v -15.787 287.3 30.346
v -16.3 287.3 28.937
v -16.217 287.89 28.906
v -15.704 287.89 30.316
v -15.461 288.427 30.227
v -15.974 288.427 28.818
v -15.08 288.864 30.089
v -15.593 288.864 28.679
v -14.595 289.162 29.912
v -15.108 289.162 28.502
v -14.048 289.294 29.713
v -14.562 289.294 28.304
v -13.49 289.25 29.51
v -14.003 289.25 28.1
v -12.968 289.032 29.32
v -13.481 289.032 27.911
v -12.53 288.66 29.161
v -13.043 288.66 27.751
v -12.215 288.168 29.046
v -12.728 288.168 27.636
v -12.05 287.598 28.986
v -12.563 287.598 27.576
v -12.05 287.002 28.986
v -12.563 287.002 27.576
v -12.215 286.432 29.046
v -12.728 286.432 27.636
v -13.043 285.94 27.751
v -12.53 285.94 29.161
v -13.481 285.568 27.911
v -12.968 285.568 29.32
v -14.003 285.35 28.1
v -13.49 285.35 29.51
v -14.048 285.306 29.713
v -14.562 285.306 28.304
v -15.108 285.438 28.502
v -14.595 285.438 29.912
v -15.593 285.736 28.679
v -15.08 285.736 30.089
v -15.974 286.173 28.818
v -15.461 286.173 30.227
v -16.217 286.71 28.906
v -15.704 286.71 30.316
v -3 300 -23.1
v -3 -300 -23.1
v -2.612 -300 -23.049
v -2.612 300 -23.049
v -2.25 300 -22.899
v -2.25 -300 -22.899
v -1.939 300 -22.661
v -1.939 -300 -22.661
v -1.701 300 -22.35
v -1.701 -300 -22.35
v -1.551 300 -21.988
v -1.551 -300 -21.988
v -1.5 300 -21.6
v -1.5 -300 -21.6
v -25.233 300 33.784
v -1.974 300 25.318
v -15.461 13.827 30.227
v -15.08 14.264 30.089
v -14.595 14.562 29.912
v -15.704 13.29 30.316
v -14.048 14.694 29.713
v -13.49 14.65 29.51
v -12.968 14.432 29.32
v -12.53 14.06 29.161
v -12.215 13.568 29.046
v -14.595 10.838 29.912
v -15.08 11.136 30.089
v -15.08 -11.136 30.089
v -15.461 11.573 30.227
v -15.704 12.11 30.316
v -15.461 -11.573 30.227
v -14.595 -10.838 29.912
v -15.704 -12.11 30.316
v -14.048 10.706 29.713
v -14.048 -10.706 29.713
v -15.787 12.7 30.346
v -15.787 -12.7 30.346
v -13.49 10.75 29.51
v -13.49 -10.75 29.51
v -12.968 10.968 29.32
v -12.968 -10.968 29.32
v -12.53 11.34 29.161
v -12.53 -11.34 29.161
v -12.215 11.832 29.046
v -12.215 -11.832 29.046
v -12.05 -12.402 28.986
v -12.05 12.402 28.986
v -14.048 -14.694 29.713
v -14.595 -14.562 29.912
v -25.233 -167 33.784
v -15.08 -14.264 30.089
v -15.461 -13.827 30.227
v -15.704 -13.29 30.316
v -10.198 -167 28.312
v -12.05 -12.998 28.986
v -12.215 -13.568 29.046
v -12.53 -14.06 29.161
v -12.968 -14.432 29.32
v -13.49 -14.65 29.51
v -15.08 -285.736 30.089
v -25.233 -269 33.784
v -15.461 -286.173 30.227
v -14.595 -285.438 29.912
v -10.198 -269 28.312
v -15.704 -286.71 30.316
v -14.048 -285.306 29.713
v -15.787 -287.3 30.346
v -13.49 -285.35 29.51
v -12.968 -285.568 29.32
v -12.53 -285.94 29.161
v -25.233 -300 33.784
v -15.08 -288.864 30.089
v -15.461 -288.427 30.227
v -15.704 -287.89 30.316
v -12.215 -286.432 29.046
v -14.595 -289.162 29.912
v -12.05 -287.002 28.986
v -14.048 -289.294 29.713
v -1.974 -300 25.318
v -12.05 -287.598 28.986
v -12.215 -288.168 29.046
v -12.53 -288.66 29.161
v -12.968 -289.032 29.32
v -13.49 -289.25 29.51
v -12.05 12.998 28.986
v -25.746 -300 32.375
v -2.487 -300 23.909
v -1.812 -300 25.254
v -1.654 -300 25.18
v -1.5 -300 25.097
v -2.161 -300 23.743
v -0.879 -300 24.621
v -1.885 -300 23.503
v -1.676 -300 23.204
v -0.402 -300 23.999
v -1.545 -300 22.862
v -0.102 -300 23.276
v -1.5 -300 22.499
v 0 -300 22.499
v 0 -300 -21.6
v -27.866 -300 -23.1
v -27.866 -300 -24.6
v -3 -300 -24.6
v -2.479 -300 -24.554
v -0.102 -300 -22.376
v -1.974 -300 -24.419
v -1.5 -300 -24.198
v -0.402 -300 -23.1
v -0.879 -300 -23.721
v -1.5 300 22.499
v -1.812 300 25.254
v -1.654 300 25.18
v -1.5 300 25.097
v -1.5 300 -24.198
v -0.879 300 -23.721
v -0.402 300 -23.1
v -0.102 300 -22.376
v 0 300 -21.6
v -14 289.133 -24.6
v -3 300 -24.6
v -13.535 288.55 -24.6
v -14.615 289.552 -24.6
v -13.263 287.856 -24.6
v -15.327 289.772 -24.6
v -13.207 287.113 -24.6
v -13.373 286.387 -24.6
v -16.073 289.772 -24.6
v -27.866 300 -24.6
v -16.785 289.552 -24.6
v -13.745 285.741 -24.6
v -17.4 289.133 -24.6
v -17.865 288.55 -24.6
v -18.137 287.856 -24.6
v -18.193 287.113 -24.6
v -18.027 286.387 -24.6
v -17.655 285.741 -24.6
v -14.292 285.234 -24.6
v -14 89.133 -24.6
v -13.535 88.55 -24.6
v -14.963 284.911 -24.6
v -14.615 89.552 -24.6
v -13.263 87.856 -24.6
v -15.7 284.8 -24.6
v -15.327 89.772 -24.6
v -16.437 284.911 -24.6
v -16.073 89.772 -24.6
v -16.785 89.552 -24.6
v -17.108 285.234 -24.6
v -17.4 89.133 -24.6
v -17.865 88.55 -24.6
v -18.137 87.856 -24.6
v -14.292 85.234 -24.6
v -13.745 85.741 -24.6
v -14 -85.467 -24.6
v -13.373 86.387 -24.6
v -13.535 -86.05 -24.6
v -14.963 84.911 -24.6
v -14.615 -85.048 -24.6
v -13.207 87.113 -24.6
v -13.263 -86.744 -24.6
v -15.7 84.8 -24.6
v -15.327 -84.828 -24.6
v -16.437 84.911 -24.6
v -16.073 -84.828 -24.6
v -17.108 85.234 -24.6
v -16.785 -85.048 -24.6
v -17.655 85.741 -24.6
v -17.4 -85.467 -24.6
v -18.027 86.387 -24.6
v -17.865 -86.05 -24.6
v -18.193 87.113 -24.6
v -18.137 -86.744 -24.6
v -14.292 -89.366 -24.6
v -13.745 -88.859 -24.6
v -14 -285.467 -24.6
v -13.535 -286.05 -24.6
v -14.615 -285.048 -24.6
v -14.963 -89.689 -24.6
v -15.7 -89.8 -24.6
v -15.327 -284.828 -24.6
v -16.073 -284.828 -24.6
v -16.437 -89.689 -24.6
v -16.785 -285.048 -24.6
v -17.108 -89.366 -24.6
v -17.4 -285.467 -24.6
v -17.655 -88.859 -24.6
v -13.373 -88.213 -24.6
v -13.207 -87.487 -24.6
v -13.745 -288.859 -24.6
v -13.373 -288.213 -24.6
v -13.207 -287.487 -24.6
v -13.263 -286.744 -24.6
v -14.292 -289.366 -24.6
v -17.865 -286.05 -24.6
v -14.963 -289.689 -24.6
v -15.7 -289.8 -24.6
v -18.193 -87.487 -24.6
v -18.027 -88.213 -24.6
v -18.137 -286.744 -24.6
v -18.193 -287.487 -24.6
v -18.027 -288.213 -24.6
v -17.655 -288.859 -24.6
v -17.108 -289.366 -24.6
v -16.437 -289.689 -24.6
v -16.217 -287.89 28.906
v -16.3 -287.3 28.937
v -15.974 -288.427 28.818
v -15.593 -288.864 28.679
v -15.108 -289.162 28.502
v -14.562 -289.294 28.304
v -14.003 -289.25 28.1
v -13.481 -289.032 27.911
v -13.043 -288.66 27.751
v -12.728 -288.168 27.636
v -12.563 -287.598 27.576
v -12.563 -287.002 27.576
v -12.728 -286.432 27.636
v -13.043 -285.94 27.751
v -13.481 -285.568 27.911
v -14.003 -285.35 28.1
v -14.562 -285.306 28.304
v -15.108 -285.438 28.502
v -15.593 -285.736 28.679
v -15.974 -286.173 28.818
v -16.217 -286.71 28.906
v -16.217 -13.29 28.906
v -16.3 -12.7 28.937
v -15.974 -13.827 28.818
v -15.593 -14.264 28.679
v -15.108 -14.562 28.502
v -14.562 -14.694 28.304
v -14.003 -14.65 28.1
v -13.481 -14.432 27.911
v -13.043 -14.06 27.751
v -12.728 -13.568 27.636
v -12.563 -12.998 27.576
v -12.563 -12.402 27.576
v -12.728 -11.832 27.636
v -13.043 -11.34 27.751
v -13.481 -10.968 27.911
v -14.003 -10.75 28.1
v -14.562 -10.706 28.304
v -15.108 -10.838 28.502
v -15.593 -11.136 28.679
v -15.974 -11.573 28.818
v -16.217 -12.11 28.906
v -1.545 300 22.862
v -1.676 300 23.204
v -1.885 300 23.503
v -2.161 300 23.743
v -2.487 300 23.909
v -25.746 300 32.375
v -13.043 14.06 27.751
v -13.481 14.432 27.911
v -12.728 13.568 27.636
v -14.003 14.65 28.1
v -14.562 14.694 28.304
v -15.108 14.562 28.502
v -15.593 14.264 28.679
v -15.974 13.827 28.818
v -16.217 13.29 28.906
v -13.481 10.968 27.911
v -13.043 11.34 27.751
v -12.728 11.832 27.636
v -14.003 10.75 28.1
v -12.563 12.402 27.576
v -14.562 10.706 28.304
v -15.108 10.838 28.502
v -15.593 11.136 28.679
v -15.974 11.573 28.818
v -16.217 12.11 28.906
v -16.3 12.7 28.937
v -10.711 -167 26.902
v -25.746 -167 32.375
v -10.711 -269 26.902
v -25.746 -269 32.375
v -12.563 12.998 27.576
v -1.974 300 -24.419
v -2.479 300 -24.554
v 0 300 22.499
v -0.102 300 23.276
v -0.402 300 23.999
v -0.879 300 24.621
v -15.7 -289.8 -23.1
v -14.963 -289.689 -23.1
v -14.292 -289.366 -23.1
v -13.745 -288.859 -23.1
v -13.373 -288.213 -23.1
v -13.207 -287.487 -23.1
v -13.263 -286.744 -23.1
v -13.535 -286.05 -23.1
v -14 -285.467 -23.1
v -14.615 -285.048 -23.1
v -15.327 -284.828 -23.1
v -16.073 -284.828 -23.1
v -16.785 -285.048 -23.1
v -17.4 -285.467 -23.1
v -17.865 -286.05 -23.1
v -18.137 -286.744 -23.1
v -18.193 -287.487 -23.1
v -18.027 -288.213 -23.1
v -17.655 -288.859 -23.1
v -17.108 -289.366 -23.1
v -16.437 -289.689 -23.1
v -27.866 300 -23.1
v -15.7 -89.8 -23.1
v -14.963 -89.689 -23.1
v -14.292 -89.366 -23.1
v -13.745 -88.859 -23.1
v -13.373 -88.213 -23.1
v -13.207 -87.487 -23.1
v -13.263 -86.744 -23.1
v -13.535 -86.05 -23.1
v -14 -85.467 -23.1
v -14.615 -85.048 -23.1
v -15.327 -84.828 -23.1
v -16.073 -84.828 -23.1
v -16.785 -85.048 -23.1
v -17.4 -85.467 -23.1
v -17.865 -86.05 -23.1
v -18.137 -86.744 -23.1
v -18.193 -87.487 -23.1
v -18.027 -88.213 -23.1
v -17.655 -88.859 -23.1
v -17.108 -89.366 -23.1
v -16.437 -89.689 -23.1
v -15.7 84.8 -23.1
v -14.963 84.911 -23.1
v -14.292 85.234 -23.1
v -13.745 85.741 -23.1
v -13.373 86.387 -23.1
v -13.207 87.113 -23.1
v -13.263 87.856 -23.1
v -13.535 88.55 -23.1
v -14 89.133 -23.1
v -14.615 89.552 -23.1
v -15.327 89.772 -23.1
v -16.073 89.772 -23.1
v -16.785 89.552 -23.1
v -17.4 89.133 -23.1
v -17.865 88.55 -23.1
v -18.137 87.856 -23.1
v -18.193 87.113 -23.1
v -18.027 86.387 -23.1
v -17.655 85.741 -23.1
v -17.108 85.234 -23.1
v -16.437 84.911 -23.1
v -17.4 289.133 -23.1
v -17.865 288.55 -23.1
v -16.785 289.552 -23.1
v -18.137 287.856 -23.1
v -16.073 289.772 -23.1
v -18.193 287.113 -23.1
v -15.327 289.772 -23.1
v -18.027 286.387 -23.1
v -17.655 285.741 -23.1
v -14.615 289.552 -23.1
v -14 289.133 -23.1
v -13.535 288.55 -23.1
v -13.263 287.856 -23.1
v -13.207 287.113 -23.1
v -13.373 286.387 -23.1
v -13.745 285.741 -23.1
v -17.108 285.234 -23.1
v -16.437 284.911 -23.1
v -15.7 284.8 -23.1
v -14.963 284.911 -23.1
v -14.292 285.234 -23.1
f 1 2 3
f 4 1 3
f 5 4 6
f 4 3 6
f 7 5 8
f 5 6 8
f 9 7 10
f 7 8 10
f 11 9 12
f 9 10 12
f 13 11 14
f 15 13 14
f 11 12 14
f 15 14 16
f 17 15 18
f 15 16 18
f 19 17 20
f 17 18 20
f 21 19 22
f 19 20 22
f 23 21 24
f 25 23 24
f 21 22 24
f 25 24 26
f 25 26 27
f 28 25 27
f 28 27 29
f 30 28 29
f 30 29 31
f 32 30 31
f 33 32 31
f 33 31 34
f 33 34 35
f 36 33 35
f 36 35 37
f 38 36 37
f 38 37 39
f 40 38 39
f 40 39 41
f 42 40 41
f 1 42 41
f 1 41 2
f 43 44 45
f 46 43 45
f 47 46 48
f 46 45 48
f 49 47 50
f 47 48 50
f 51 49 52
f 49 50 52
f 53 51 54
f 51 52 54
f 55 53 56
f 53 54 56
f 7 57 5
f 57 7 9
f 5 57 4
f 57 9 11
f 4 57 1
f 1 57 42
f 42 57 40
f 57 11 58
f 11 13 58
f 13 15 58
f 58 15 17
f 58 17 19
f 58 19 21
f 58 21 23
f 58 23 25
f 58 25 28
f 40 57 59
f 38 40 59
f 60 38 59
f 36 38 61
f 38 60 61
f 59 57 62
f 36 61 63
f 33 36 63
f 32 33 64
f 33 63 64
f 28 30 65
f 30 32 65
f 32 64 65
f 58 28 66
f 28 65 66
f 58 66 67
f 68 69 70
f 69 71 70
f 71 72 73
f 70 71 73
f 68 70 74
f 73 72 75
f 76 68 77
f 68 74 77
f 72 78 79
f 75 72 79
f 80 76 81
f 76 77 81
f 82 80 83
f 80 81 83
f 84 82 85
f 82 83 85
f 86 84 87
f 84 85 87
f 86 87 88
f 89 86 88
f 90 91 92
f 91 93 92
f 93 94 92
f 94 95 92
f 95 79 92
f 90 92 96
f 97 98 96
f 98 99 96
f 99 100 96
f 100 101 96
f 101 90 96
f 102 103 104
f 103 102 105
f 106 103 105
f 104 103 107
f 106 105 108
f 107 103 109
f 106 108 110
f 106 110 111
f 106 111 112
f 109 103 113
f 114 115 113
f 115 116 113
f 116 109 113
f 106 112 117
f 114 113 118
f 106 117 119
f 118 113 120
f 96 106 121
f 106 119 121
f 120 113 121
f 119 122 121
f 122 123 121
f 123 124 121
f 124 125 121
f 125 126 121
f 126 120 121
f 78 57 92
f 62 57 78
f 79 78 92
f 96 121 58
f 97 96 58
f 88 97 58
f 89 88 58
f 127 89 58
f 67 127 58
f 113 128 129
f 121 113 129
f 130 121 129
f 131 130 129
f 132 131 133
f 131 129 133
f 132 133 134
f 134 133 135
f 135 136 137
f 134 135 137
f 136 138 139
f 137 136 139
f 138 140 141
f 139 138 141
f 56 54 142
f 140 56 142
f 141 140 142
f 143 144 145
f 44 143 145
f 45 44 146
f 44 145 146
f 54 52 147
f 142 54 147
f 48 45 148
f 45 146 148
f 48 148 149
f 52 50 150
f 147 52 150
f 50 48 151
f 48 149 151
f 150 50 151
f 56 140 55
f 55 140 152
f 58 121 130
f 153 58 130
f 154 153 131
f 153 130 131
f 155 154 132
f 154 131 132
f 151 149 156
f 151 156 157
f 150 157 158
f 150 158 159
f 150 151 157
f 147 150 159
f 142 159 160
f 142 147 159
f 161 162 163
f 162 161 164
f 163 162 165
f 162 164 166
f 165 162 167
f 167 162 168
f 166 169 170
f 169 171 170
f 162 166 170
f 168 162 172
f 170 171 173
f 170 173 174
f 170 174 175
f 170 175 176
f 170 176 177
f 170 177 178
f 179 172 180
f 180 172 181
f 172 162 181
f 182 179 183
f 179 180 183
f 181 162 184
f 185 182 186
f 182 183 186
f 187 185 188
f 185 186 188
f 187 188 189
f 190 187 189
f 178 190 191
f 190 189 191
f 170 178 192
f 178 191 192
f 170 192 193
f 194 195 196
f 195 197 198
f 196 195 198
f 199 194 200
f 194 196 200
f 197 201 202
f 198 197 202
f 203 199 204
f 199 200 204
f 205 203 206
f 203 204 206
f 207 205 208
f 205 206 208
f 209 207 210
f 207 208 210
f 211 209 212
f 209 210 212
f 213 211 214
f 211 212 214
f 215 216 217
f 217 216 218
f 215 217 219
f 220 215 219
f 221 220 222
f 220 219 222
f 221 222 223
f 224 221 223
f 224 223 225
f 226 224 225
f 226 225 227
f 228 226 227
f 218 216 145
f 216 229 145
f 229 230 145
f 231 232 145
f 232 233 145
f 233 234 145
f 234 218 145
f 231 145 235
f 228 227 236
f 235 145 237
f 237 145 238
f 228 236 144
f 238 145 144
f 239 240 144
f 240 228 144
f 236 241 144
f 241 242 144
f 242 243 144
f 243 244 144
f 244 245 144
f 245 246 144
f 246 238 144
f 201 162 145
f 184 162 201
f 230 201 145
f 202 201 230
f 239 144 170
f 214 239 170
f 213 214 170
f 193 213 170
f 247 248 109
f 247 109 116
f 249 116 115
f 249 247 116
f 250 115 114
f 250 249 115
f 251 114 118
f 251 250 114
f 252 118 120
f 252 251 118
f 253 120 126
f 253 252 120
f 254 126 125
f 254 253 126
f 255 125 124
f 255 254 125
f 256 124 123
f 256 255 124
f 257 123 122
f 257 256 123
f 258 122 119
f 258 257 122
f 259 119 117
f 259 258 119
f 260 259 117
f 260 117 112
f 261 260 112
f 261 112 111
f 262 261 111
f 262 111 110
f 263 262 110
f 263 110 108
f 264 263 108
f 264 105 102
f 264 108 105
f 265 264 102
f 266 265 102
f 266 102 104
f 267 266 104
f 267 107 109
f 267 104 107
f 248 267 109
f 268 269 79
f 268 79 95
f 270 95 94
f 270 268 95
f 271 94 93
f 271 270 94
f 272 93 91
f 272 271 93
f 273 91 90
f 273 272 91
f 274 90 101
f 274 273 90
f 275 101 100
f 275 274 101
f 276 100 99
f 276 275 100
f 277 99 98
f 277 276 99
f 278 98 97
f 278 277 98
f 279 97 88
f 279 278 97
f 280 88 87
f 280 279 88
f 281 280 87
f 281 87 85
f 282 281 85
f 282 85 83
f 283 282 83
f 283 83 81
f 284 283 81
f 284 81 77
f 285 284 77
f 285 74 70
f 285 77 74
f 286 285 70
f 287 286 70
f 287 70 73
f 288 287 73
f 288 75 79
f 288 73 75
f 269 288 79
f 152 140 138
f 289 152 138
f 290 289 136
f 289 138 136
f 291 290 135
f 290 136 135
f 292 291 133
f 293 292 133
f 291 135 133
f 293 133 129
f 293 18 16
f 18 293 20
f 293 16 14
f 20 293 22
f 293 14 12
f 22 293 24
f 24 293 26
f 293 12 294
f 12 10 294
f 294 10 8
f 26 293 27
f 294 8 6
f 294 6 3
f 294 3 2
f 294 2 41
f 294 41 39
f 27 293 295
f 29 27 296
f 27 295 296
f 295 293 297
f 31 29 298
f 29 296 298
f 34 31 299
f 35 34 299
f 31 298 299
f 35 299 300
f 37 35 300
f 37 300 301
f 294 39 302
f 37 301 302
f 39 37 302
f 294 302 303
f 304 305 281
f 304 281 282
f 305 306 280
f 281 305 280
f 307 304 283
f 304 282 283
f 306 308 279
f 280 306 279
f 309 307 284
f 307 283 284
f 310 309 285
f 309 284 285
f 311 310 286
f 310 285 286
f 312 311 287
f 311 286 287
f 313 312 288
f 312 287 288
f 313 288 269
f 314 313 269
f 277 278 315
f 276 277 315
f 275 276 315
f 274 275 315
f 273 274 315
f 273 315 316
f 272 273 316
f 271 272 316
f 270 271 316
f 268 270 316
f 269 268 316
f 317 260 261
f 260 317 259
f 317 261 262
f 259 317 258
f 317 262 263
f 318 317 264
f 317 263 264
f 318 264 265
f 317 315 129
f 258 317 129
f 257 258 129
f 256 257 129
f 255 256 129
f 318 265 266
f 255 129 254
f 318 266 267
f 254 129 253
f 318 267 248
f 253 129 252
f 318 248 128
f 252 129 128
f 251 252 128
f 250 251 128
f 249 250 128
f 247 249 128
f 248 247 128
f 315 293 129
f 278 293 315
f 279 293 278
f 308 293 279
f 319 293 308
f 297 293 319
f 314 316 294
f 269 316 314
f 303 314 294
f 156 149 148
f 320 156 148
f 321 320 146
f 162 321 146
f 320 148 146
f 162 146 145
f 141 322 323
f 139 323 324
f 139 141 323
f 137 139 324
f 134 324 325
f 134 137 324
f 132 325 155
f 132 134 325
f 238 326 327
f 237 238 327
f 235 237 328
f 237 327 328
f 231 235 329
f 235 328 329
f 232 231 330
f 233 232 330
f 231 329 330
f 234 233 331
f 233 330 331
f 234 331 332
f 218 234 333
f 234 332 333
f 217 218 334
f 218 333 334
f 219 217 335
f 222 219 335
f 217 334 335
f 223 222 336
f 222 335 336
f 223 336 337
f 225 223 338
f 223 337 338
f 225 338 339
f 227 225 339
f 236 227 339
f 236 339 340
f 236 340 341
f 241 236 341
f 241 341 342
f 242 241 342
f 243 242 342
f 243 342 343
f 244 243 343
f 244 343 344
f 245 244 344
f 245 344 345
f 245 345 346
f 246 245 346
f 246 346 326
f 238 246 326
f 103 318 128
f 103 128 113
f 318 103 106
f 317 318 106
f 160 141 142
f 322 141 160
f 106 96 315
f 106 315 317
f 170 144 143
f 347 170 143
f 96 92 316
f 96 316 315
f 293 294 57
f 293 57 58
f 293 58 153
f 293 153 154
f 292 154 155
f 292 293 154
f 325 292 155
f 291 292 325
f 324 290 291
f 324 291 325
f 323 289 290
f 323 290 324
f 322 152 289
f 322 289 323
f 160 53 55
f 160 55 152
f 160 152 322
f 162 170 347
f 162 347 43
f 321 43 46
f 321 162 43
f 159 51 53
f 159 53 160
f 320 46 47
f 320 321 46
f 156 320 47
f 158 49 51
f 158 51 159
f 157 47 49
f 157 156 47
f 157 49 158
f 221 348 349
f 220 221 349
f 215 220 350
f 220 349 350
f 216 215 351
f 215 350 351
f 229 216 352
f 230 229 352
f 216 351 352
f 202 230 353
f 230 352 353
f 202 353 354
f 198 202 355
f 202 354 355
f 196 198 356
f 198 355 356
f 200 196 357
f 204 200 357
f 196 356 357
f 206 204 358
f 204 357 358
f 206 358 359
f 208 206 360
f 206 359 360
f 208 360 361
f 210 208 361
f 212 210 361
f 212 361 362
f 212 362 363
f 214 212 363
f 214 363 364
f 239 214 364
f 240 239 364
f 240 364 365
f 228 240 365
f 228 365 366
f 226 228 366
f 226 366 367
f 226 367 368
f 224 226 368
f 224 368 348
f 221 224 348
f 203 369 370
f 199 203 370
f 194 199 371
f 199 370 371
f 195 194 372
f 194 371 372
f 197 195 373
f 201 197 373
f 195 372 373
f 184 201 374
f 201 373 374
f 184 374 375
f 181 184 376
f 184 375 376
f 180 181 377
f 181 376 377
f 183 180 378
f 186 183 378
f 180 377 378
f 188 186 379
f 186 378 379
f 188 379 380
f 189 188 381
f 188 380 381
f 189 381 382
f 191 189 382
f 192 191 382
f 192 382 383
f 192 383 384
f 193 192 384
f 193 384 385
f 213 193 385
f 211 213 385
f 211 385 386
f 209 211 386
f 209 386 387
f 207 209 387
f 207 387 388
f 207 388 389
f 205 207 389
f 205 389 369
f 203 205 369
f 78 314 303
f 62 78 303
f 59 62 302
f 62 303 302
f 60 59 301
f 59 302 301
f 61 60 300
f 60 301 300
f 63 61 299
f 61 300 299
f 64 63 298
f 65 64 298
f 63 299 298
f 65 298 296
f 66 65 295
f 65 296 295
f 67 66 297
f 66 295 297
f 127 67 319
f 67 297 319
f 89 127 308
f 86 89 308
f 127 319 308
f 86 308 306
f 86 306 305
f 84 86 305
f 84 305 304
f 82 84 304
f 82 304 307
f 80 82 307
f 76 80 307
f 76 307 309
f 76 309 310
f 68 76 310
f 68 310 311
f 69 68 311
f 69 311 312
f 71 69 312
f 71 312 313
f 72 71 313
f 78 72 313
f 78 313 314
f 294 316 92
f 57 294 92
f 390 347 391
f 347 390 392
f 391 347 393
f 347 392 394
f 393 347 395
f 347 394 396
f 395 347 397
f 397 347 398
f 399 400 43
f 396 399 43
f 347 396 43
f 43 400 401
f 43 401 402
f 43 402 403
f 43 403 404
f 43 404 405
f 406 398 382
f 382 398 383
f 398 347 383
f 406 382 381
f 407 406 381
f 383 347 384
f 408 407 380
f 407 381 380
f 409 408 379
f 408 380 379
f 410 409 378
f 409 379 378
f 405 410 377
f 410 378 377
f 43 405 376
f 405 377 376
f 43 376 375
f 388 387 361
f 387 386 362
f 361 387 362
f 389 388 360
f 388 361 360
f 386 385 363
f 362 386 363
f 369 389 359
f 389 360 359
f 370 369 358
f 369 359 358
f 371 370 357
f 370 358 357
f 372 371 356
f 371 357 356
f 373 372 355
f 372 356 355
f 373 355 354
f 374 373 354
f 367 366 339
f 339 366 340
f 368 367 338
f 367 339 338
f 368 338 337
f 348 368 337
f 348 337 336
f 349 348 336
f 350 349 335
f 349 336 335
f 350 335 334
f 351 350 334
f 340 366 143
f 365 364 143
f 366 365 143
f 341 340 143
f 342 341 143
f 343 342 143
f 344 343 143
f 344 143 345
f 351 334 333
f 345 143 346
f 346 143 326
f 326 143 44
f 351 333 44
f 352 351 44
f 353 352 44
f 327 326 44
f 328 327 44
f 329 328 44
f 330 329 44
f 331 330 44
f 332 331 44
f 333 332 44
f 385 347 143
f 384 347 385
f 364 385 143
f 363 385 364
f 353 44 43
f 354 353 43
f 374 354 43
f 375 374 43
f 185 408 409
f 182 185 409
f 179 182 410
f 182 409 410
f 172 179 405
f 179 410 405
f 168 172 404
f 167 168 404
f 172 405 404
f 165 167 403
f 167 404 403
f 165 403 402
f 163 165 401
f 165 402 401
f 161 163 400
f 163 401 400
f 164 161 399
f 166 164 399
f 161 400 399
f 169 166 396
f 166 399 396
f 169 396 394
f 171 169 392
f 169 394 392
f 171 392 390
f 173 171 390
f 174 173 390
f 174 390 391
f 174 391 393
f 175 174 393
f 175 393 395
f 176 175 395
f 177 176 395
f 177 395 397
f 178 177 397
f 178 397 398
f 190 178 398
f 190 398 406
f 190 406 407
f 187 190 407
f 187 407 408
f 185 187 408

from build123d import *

# Parameters (mm, degrees)
SKETCH1_W                    = 600
SKETCH1_H                    = 100
BASE_FLANGE1_DEPTH           = 1.5
SKETCHED_START               = -300
SKETCHED_BEND1_DEPTH         = 600
SKETCHED_BEND1_2_DEPTH       = 600
SKETCHED_BEND2_DEPTH         = 600
SKETCHED_BEND2_2_DEPTH       = 600
F_4_0_4_DIAMETER_HOLE1_D     = 4
F_5_0_5_DIAMETER_HOLE1_D     = 5
F_5_0_5_DIAMETER_HOLE1_DEPTH = 1.5
CUT_EXTRUDE1_REACH           = 307.656
SKETCH12_W                   = 102
SKETCH12_H                   = 16


# Read off the part's stored shape, not the designer's step: Sketched Bend1, Sketched Bend2
# Sheet-metal steps are written as plain solids
with BuildPart() as part:
    # Sketch1 → Base-Flange1 (new body)
    with BuildSketch(Plane.YZ):
        Rectangle(SKETCH1_W, SKETCH1_H)
    extrude(amount=-BASE_FLANGE1_DEPTH)

    # Sketched Bend1 outline → Sketched Bend1 (cut)
    with BuildSketch(Plane(origin=(0, 0, 0), x_dir=(1, 0, 0), z_dir=(0, 1, 0)).offset(SKETCHED_START)):
        with BuildLine():
            Line((-1.5, 50), (-1.5, 24.198076212))
            ThreePointArc((-1.5, 24.198076212), (-0.401923788, 23.1), (0, 21.6))
            Line((0, 21.6), (0, 50))
            Line((0, 50), (-1.5, 50))
        make_face()
    extrude(amount=SKETCHED_BEND1_DEPTH, mode=Mode.SUBTRACT)

    # Sketched Bend1 2 outline → Sketched Bend1 2 (add)
    with BuildSketch(Plane(origin=(0, 0, 0), x_dir=(1, 0, 0), z_dir=(0, 1, 0)).offset(SKETCHED_START)):
        with BuildLine():
            Line((-27.865708265, 24.6), (-27.865708265, 23.1))
            Line((-27.865708265, 23.1), (-3, 23.1))
            ThreePointArc((-3, 23.1), (-1.939339828, 22.660660172), (-1.5, 21.6))
            Line((-1.5, 21.6), (-1.5, 24.198076212))
            ThreePointArc((-1.5, 24.198076212), (-2.223542865, 24.497777479), (-3, 24.6))
            Line((-3, 24.6), (-27.865708265, 24.6))
        make_face()
    extrude(amount=SKETCHED_BEND1_2_DEPTH)

    # Sketched Bend2 outline → Sketched Bend2 (cut)
    with BuildSketch(Plane(origin=(0, 0, 0), x_dir=(1, 0, 0), z_dir=(0, 1, 0)).offset(SKETCHED_START)):
        with BuildLine():
            ThreePointArc((0, -22.499377385), (-0.401923789, -23.999377385), (-1.5, -25.097453597))
            Line((-1.5, -25.097453597), (-1.5, -50))
            Line((-1.5, -50), (0, -50))
            Line((0, -50), (0, -22.499377385))
        make_face()
    extrude(amount=SKETCHED_BEND2_DEPTH, mode=Mode.SUBTRACT)

    # Sketched Bend2 2 outline → Sketched Bend2 2 (add)
    with BuildSketch(Plane(origin=(0, 0, 0), x_dir=(1, 0, 0), z_dir=(0, 1, 0)).offset(SKETCHED_START)):
        with BuildLine():
            ThreePointArc((-1.5, -22.499377385), (-1.771271934, -23.35974204), (-2.486969785, -23.908916317))
            Line((-2.486969785, -23.908916317), (-25.745986918, -32.374506231))
            Line((-25.745986918, -32.374506231), (-25.232956703, -33.784045162))
            Line((-25.232956703, -33.784045162), (-1.97393957, -25.318455248))
            ThreePointArc((-1.97393957, -25.318455248), (-1.732145215, -25.218300747), (-1.5, -25.097453597))
            Line((-1.5, -25.097453597), (-1.5, -22.499377385))
        make_face()
    extrude(amount=SKETCHED_BEND2_2_DEPTH)

    # Ø4.0 (4) Diameter Hole1 (through all)
    with Locations(Plane(origin=(7.906287599, 0, 21.72234665), x_dir=(0.9396926207859094, 0, -0.34202014332566616), z_dir=(0.34202014332566616, 0, 0.9396926207859094))):
        with Locations((-23.21431814, 287.3), (-23.21431814, 12.7)):
            f_4_0_4_diameter_hole1 = Hole(F_4_0_4_DIAMETER_HOLE1_D / 2)

    # Mirror1: Ø4.0 (4) Diameter Hole1 across plane
    add(f_4_0_4_diameter_hole1.mirror(Plane.ZX), mode=Mode.SUBTRACT)

    # Ø5.0 (5) Diameter Hole1
    with Locations(Plane.YX.offset(24.6)):
        with Locations((-287.3, -15.7), (-87.3, -15.7), (87.3, -15.7), (287.3, -15.7)):
            Hole(F_5_0_5_DIAMETER_HOLE1_D / 2, depth=F_5_0_5_DIAMETER_HOLE1_DEPTH)

    # Sketch12 → Cut-Extrude1 (cut, up to next)
    with BuildSketch(Plane(origin=(7.906287599, 0, 21.72234665), x_dir=(0, -1, 0), z_dir=(0.34202014332566616, 0, 0.9396926207859094)), mode=Mode.PRIVATE) as cut_extrude1_sk1:
        with Locations((218, -27.266047183)):
            Rectangle(SKETCH12_W, SKETCH12_H)
    cut_extrude1_tool1 = extrude(cut_extrude1_sk1.sketch, amount=-CUT_EXTRUDE1_REACH, mode=Mode.PRIVATE) & part.part
    add(cut_extrude1_tool1.solids().sort_by_distance((-17.715416, -218, 31.047884))[0], mode=Mode.SUBTRACT)


solid = part.part
